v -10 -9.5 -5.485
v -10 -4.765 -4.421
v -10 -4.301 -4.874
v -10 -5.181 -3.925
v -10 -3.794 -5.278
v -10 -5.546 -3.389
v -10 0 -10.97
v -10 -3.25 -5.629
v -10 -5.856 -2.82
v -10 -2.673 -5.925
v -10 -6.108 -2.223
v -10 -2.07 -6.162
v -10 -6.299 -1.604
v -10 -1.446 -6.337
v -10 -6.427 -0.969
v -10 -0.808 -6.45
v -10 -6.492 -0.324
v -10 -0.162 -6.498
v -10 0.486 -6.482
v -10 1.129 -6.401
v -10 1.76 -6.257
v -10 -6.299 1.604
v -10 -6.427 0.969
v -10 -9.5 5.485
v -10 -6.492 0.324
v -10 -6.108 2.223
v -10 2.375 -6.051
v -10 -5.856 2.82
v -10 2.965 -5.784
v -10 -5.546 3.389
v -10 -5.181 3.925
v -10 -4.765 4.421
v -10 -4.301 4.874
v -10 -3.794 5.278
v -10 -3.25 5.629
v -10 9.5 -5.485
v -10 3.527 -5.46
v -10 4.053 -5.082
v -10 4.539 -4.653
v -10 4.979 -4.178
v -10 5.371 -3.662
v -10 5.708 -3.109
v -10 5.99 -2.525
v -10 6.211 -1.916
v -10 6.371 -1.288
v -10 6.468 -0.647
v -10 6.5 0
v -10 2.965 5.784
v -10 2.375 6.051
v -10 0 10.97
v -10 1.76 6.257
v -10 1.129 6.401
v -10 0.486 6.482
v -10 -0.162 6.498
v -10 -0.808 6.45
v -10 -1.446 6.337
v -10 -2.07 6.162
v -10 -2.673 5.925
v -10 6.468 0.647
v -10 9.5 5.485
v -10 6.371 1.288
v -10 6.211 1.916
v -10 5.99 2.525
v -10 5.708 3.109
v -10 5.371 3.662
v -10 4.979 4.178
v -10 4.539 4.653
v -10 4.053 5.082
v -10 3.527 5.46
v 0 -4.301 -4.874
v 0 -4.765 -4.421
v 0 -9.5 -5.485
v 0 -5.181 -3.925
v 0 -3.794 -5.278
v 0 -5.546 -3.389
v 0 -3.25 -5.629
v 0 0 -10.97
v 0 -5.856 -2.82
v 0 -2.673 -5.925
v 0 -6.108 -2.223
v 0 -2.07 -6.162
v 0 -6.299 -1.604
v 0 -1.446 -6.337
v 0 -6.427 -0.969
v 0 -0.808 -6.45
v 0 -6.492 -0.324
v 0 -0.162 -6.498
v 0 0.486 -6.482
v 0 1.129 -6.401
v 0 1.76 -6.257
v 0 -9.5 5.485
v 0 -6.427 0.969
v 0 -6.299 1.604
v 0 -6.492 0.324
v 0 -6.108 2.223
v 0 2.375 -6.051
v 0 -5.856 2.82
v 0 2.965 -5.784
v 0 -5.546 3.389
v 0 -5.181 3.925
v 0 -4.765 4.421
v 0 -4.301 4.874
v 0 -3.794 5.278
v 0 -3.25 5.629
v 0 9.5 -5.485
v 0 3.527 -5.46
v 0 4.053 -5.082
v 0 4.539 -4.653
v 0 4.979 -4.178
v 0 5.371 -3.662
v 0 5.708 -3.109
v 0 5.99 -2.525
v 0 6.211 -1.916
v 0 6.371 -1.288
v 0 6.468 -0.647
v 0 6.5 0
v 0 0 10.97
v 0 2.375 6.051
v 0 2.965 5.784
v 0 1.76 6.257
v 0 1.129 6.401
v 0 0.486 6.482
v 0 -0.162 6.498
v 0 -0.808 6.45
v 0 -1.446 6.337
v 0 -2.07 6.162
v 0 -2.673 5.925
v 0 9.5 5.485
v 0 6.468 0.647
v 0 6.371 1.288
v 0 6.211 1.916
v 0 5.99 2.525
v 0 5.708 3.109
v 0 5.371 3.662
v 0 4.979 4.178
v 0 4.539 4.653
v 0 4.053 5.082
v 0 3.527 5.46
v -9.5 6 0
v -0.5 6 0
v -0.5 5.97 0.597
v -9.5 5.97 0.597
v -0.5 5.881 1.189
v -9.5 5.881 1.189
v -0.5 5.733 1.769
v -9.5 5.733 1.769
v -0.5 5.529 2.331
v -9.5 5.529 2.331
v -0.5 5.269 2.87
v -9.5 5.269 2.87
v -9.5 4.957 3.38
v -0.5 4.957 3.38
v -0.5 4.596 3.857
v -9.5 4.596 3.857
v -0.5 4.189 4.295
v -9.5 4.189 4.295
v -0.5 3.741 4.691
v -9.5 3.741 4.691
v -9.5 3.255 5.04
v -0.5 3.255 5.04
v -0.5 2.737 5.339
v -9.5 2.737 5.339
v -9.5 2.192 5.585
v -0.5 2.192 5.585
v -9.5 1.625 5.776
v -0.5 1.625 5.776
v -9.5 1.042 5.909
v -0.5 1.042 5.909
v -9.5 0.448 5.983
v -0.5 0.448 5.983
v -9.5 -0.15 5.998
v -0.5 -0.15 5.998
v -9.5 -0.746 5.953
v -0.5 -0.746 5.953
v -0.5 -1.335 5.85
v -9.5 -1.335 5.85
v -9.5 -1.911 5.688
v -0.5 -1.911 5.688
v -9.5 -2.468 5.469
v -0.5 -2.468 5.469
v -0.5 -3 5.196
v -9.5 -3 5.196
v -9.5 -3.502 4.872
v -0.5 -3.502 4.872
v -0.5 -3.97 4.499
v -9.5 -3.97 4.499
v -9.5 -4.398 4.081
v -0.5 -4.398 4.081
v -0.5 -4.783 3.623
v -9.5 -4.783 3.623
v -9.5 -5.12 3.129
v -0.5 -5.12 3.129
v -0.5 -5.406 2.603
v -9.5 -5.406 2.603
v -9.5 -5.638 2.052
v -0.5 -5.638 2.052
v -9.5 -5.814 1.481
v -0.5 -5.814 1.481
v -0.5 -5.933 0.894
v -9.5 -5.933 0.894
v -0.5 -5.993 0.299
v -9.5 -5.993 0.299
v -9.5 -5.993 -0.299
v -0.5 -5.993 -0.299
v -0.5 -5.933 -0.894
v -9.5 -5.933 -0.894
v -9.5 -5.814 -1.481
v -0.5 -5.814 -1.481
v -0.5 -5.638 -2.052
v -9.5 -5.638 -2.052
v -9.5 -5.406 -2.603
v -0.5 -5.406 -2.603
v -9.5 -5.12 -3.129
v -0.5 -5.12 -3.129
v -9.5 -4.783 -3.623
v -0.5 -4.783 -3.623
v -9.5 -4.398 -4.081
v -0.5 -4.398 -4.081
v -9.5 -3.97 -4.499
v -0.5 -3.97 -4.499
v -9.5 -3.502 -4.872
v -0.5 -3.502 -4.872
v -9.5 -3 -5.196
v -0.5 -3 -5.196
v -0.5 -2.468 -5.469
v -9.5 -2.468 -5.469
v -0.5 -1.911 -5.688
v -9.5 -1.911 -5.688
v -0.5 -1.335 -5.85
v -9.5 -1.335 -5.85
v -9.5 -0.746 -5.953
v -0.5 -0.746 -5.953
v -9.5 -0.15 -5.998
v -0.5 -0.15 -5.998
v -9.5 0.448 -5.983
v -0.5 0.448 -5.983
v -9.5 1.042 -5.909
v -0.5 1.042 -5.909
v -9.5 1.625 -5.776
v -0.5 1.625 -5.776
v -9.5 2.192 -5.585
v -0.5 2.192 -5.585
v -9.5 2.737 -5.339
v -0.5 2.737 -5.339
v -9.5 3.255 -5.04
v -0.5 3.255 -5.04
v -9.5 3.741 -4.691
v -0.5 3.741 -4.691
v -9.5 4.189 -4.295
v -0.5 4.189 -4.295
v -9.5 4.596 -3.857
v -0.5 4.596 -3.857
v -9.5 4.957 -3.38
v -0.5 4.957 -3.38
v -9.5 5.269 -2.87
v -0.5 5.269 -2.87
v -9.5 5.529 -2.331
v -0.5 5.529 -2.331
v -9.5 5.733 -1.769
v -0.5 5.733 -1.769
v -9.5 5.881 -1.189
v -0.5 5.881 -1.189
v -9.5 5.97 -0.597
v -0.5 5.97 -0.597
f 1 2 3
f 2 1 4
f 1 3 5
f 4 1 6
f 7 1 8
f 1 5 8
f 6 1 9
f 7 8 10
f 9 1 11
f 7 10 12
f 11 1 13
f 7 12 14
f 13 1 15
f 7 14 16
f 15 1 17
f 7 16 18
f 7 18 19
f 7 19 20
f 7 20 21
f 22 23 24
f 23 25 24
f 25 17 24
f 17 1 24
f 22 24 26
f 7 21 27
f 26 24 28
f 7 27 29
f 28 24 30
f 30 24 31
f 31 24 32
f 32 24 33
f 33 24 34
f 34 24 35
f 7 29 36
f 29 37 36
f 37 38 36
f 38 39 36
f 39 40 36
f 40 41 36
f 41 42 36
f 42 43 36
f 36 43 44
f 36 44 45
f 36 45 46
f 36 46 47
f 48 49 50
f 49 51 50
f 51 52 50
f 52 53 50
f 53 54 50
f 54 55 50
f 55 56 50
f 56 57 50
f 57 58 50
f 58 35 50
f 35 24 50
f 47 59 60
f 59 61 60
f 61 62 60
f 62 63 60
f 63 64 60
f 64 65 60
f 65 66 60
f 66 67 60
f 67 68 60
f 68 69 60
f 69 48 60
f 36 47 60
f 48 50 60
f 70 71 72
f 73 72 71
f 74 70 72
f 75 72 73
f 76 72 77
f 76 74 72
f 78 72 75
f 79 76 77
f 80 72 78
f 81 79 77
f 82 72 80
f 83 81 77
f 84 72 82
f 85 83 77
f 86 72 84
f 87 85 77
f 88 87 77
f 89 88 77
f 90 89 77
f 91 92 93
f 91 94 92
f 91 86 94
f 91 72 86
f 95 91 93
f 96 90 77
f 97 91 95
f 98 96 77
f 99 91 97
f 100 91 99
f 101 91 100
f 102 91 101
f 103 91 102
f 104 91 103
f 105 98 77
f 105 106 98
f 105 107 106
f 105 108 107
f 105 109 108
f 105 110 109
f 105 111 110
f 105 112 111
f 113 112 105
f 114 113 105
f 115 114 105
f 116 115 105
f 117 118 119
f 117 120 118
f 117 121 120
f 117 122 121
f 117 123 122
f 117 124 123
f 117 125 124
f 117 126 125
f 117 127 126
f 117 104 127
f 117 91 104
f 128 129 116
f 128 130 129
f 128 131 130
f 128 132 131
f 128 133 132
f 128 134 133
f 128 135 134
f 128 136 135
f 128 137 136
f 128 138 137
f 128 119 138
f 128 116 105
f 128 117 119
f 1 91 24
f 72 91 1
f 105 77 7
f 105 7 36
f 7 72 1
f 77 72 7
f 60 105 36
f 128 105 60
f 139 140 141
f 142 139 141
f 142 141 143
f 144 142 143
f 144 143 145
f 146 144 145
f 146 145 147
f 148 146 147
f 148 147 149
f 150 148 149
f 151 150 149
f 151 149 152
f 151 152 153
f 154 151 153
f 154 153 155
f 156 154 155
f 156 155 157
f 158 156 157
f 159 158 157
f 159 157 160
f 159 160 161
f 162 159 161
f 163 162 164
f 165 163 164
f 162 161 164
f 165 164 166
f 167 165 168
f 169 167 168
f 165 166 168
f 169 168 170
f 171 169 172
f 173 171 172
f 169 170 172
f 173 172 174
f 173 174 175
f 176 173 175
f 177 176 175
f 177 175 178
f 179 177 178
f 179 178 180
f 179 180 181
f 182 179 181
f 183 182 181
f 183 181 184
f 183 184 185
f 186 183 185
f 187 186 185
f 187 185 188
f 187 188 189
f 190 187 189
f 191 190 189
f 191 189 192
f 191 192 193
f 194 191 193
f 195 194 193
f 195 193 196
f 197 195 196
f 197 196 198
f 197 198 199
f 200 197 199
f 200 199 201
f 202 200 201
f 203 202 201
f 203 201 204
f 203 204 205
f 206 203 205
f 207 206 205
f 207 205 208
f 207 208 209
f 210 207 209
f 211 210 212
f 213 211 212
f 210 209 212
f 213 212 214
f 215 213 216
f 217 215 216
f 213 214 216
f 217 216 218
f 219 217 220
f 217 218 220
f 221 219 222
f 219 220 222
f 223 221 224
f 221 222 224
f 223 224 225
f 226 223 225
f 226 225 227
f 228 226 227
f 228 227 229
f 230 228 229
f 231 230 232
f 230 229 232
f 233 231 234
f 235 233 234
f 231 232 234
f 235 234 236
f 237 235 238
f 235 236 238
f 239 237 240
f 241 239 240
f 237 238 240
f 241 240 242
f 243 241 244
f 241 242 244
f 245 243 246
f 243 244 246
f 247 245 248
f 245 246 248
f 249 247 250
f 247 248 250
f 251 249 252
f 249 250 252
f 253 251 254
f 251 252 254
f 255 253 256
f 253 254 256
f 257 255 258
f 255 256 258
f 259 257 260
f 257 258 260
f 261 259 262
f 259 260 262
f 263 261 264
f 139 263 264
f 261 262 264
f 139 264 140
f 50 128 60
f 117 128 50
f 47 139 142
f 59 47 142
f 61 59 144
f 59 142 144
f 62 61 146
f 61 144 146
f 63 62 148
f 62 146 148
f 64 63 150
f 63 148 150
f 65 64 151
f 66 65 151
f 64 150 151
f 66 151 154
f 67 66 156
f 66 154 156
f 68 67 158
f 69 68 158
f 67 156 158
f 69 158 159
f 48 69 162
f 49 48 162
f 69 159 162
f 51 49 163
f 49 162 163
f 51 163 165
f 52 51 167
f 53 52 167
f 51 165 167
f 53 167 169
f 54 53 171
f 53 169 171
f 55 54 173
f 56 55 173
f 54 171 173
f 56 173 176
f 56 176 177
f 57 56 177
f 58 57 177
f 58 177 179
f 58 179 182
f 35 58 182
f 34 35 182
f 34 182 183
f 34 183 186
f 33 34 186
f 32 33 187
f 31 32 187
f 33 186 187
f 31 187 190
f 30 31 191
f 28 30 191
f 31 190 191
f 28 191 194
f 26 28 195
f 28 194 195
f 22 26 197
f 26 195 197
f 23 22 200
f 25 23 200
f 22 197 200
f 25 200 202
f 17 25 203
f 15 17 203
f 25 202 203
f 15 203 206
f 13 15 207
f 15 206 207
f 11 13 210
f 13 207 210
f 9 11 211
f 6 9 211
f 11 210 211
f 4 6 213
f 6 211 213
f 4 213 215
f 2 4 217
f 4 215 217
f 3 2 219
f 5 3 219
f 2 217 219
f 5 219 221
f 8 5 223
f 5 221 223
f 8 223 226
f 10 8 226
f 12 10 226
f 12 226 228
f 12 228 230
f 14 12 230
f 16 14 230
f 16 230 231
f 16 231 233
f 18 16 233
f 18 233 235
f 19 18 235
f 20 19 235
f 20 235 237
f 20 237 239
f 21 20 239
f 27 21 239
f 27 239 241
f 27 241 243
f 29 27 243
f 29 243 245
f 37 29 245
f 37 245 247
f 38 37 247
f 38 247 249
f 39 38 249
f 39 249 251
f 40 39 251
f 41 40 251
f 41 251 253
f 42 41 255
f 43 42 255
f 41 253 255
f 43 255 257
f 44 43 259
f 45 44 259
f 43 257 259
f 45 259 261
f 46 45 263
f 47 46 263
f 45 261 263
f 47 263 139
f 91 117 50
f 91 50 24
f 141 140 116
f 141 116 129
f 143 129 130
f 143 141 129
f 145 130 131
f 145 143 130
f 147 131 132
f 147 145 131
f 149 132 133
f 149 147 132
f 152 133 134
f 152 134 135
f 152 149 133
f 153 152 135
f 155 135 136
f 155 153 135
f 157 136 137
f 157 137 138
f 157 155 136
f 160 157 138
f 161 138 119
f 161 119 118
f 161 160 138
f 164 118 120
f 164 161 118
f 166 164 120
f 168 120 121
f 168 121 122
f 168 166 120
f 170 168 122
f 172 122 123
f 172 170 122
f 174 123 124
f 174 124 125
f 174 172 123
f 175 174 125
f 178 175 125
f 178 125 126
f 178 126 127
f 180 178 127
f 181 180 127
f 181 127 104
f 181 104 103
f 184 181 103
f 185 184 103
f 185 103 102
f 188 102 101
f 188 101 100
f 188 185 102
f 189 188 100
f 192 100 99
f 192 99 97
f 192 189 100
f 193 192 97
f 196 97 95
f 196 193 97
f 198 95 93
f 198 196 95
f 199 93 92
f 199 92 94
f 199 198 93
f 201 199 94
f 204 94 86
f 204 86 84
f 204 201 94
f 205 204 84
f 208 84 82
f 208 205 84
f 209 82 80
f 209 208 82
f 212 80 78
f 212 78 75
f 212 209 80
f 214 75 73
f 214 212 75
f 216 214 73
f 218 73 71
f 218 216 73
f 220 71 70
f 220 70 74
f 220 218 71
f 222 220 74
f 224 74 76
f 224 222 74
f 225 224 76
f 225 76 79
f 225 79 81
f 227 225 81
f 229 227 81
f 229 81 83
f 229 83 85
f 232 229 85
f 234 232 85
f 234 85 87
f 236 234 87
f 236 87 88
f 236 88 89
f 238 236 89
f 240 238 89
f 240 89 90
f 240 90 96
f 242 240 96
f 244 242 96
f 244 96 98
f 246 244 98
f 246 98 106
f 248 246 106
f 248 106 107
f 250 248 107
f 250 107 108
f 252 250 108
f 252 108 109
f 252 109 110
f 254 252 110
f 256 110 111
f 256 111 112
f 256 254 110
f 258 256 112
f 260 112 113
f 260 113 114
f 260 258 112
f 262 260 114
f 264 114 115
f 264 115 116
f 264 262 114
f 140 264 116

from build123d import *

# Parameters (mm, degrees)
F1_DEPTH = 10
F2_R     = 6
F3_DEPTH = 10.001
F4_SIZE  = 0.5


with BuildPart() as f1:
    # F0 (on Right) → F1 (new body)
    with BuildSketch(Plane.YZ):
        Polygon((0, -10.969655), (9.5, -5.484828), (9.5, 5.484828), (0, 10.969655), (-9.5, 5.484828), (-9.5, -5.484828), align=None)
    extrude(amount=-F1_DEPTH)

    # F2 (on face) → F3 (cut, through all)
    with BuildSketch(Plane.YZ):
        Circle(F2_R)
    extrude(amount=-F3_DEPTH, mode=Mode.SUBTRACT)

    # F4
    f4_edges = [f1.edges().sort_by_distance(p)[0] for p in [
        (0, -6, 0),
        (-5, 6, 0),
        (-10, -6, 0),
    ]]
    chamfer(f4_edges, length=F4_SIZE)


solid = f1.part
